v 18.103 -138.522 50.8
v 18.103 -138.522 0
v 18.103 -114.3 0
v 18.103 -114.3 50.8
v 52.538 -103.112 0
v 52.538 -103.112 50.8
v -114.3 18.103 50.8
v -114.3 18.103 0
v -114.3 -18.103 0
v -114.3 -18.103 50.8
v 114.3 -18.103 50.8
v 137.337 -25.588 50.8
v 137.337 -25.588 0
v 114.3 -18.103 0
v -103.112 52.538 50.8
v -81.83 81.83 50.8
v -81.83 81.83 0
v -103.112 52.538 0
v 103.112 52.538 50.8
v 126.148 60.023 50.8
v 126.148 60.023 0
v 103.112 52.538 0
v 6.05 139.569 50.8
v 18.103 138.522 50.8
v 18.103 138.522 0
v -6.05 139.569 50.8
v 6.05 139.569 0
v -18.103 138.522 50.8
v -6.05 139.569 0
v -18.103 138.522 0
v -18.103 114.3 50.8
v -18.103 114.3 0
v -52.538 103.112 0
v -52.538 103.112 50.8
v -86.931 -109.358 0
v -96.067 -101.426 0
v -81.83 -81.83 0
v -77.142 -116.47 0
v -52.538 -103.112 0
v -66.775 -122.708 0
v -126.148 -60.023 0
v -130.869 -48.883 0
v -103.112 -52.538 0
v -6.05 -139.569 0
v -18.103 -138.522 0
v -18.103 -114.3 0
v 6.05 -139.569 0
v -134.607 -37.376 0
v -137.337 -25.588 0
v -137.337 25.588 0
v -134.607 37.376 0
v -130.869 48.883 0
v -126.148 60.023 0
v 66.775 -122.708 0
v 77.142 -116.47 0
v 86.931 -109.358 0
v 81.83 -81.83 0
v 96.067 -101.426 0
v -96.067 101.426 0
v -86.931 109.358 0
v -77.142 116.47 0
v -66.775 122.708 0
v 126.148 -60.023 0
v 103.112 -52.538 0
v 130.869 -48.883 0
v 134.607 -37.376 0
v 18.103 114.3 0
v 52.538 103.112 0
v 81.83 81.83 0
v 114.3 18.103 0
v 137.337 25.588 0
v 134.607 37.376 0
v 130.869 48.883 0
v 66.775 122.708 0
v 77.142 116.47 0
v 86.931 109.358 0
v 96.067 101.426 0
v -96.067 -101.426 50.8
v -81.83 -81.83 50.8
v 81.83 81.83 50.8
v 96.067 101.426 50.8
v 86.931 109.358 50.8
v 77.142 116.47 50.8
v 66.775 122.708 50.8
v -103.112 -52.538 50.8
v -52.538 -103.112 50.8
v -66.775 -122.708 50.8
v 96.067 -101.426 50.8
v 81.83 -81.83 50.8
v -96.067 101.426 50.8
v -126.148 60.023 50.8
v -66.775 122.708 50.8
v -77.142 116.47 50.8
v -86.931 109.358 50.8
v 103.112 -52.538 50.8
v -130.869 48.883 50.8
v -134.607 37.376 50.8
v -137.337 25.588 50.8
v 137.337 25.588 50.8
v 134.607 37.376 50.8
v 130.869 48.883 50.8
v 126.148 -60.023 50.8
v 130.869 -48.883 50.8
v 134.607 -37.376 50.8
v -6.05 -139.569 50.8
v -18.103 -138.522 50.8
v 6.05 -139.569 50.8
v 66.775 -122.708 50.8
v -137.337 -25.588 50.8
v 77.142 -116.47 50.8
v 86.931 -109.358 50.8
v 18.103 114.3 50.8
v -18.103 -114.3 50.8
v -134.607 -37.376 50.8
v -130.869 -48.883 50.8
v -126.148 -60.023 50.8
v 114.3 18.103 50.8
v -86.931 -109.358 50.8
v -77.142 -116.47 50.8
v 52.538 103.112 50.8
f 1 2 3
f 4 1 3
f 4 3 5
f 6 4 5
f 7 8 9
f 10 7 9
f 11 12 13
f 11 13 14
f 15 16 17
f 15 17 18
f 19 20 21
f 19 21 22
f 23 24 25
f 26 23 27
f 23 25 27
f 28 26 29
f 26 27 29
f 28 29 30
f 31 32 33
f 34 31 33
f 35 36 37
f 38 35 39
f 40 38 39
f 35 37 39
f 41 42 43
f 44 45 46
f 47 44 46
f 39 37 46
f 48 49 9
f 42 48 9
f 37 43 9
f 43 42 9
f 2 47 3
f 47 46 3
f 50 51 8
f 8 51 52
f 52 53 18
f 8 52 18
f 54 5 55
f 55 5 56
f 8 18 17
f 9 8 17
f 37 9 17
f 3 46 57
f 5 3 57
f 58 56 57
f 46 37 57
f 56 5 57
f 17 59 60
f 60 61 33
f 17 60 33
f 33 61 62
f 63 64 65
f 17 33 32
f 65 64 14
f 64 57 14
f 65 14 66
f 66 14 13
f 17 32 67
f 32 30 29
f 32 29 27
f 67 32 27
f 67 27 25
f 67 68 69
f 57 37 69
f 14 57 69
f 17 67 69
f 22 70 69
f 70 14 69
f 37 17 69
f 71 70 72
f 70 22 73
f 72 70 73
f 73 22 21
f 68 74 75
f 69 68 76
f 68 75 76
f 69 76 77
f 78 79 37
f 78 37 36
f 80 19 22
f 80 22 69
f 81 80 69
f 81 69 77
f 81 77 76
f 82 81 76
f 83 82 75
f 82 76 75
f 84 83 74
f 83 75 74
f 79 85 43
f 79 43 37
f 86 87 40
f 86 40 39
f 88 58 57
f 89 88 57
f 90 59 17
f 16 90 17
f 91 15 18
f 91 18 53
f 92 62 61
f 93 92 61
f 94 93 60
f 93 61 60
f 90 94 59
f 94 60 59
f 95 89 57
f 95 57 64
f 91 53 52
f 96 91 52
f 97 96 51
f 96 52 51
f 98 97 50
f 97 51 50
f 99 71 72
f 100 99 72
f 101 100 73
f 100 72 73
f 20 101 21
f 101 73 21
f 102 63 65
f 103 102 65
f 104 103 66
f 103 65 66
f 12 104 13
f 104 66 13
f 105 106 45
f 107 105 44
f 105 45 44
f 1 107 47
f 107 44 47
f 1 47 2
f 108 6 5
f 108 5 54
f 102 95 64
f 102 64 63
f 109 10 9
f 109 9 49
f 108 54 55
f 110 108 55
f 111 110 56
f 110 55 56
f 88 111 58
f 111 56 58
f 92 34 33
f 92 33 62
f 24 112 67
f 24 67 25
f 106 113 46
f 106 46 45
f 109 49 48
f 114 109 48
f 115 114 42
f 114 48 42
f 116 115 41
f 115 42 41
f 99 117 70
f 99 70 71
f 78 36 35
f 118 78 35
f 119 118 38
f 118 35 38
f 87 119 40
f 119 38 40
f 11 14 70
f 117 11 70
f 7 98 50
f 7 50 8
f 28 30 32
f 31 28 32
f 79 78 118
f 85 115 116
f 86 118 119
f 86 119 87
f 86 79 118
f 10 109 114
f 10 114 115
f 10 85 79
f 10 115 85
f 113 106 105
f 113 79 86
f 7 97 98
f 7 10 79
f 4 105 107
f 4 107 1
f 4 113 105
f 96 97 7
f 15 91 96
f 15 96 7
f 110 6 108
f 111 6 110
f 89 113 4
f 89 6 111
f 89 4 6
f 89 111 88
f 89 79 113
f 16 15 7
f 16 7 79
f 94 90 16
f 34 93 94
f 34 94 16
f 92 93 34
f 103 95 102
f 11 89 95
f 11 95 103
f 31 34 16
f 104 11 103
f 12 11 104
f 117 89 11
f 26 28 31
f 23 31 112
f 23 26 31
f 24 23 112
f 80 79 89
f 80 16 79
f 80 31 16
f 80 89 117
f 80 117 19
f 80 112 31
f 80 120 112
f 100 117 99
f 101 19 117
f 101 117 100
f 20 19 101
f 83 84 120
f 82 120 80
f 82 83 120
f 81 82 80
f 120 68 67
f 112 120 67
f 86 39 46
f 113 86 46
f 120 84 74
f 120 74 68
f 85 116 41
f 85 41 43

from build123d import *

# Parameters (mm, degrees)
F0_R     = 139.7
F1_DEPTH = 50.8
F3_DEPTH = 50.801


with BuildPart() as f1:
    # F0 (on Top) → F1 (new body)
    with BuildSketch(Plane.XY):
        Circle(F0_R)
    extrude(amount=F1_DEPTH)

    # F2 (on face) → F3 (intersect, through all)
    with BuildSketch(Plane.XY.offset(50.8)):
        with BuildLine():
            Line((-81.829765289, 81.829765289), (-52.537943385, 103.1115196251))
            Line((-52.537943385, 103.1115196251), (-66.7753086177, 122.7075717265))
            ThreePointArc((-66.7753086177, 122.7075717265), (-82.1135997453, 113.0196741142), (-96.0671305217, 101.4258173904))
            Line((-96.0671305217, 101.4258173905), (-81.829765289, 81.829765289))
        make_face()
        with BuildLine():
            Line((-18.1033415291, 114.3), (18.1033415291, 114.3))
            Line((18.1033415291, 114.3), (18.1033415291, 138.522052488))
            ThreePointArc((18.1033415291, 138.522052488), (0, 139.7), (-18.1033415291, 138.522052488))
            Line((-18.1033415291, 138.522052488), (-18.1033415291, 114.3))
        make_face()
        with BuildLine():
            Line((52.537943385, 103.1115196251), (81.829765289, 81.829765289))
            Line((81.829765289, 81.829765289), (96.0671305217, 101.4258173905))
            ThreePointArc((96.0671305217, 101.4258173904), (82.1135997453, 113.0196741142), (66.7753086177, 122.7075717265))
            Line((66.7753086177, 122.7075717265), (52.537943385, 103.1115196251))
        make_face()
        with BuildLine():
            Line((103.1115196251, 52.537943385), (114.3, 18.1033415291))
            Line((114.3, 18.1033415291), (137.3365408567, 25.5883673865))
            ThreePointArc((137.3365408567, 25.5883673865), (132.8625953264, 43.1696741142), (126.1480604818, 60.0229692424))
            Line((126.1480604818, 60.0229692424), (103.1115196251, 52.537943385))
        make_face()
        with BuildLine():
            Line((137.3365408567, -25.5883673865), (114.3, -18.1033415291))
            Line((114.3, -18.1033415291), (103.1115196251, -52.537943385))
            Line((103.1115196251, -52.537943385), (126.1480604818, -60.0229692424))
            ThreePointArc((126.1480604818, -60.0229692424), (132.8625953264, -43.1696741142), (137.3365408567, -25.5883673865))
        make_face()
        with BuildLine():
            Line((96.0671305217, -101.4258173905), (81.829765289, -81.829765289))
            Line((81.829765289, -81.829765289), (52.537943385, -103.1115196251))
            Line((52.537943385, -103.1115196251), (66.7753086177, -122.7075717265))
            ThreePointArc((66.7753086177, -122.7075717265), (82.1135997453, -113.0196741142), (96.0671305217, -101.4258173904))
        make_face()
        with BuildLine():
            Line((18.1033415291, -138.522052488), (18.1033415291, -114.3))
            Line((18.1033415291, -114.3), (-18.1033415291, -114.3))
            Line((-18.1033415291, -114.3), (-18.1033415291, -138.522052488))
            ThreePointArc((-18.1033415291, -138.522052488), (0, -139.7), (18.1033415291, -138.522052488))
        make_face()
        with BuildLine():
            Line((-66.7753086177, -122.7075717265), (-52.537943385, -103.1115196251))
            Line((-52.537943385, -103.1115196251), (-81.829765289, -81.829765289))
            Line((-81.829765289, -81.829765289), (-96.0671305217, -101.4258173905))
            ThreePointArc((-96.0671305217, -101.4258173904), (-82.1135997453, -113.0196741142), (-66.7753086177, -122.7075717265))
        make_face()
        with BuildLine():
            Line((-126.1480604818, -60.0229692424), (-103.1115196251, -52.537943385))
            Line((-103.1115196251, -52.537943385), (-114.3, -18.1033415291))
            Line((-114.3, -18.1033415291), (-137.3365408567, -25.5883673865))
            ThreePointArc((-137.3365408567, -25.5883673865), (-132.8625953264, -43.1696741142), (-126.1480604818, -60.0229692424))
        make_face()
        with BuildLine():
            Line((-114.3, 18.1033415291), (-103.1115196251, 52.537943385))
            Line((-103.1115196251, 52.537943385), (-126.1480604818, 60.0229692424))
            ThreePointArc((-126.1480604818, 60.0229692424), (-132.8625953264, 43.1696741142), (-137.3365408567, 25.5883673865))
            Line((-137.3365408567, 25.5883673865), (-114.3, 18.1033415291))
        make_face()
        Polygon((114.3, -18.1033415291), (114.3, 18.1033415291), (103.1115196251, 52.537943385), (81.829765289, 81.829765289), (52.537943385, 103.1115196251), (18.1033415291, 114.3), (-18.1033415291, 114.3), (-52.537943385, 103.1115196251), (-81.829765289, 81.829765289), (-103.1115196251, 52.537943385), (-114.3, 18.1033415291), (-114.3, -18.1033415291), (-103.1115196251, -52.537943385), (-81.829765289, -81.829765289), (-52.537943385, -103.1115196251), (-18.1033415291, -114.3), (18.1033415291, -114.3), (52.537943385, -103.1115196251), (81.829765289, -81.829765289), (103.1115196251, -52.537943385), align=None)
    extrude(amount=-F3_DEPTH, mode=Mode.INTERSECT)


solid = f1.part
